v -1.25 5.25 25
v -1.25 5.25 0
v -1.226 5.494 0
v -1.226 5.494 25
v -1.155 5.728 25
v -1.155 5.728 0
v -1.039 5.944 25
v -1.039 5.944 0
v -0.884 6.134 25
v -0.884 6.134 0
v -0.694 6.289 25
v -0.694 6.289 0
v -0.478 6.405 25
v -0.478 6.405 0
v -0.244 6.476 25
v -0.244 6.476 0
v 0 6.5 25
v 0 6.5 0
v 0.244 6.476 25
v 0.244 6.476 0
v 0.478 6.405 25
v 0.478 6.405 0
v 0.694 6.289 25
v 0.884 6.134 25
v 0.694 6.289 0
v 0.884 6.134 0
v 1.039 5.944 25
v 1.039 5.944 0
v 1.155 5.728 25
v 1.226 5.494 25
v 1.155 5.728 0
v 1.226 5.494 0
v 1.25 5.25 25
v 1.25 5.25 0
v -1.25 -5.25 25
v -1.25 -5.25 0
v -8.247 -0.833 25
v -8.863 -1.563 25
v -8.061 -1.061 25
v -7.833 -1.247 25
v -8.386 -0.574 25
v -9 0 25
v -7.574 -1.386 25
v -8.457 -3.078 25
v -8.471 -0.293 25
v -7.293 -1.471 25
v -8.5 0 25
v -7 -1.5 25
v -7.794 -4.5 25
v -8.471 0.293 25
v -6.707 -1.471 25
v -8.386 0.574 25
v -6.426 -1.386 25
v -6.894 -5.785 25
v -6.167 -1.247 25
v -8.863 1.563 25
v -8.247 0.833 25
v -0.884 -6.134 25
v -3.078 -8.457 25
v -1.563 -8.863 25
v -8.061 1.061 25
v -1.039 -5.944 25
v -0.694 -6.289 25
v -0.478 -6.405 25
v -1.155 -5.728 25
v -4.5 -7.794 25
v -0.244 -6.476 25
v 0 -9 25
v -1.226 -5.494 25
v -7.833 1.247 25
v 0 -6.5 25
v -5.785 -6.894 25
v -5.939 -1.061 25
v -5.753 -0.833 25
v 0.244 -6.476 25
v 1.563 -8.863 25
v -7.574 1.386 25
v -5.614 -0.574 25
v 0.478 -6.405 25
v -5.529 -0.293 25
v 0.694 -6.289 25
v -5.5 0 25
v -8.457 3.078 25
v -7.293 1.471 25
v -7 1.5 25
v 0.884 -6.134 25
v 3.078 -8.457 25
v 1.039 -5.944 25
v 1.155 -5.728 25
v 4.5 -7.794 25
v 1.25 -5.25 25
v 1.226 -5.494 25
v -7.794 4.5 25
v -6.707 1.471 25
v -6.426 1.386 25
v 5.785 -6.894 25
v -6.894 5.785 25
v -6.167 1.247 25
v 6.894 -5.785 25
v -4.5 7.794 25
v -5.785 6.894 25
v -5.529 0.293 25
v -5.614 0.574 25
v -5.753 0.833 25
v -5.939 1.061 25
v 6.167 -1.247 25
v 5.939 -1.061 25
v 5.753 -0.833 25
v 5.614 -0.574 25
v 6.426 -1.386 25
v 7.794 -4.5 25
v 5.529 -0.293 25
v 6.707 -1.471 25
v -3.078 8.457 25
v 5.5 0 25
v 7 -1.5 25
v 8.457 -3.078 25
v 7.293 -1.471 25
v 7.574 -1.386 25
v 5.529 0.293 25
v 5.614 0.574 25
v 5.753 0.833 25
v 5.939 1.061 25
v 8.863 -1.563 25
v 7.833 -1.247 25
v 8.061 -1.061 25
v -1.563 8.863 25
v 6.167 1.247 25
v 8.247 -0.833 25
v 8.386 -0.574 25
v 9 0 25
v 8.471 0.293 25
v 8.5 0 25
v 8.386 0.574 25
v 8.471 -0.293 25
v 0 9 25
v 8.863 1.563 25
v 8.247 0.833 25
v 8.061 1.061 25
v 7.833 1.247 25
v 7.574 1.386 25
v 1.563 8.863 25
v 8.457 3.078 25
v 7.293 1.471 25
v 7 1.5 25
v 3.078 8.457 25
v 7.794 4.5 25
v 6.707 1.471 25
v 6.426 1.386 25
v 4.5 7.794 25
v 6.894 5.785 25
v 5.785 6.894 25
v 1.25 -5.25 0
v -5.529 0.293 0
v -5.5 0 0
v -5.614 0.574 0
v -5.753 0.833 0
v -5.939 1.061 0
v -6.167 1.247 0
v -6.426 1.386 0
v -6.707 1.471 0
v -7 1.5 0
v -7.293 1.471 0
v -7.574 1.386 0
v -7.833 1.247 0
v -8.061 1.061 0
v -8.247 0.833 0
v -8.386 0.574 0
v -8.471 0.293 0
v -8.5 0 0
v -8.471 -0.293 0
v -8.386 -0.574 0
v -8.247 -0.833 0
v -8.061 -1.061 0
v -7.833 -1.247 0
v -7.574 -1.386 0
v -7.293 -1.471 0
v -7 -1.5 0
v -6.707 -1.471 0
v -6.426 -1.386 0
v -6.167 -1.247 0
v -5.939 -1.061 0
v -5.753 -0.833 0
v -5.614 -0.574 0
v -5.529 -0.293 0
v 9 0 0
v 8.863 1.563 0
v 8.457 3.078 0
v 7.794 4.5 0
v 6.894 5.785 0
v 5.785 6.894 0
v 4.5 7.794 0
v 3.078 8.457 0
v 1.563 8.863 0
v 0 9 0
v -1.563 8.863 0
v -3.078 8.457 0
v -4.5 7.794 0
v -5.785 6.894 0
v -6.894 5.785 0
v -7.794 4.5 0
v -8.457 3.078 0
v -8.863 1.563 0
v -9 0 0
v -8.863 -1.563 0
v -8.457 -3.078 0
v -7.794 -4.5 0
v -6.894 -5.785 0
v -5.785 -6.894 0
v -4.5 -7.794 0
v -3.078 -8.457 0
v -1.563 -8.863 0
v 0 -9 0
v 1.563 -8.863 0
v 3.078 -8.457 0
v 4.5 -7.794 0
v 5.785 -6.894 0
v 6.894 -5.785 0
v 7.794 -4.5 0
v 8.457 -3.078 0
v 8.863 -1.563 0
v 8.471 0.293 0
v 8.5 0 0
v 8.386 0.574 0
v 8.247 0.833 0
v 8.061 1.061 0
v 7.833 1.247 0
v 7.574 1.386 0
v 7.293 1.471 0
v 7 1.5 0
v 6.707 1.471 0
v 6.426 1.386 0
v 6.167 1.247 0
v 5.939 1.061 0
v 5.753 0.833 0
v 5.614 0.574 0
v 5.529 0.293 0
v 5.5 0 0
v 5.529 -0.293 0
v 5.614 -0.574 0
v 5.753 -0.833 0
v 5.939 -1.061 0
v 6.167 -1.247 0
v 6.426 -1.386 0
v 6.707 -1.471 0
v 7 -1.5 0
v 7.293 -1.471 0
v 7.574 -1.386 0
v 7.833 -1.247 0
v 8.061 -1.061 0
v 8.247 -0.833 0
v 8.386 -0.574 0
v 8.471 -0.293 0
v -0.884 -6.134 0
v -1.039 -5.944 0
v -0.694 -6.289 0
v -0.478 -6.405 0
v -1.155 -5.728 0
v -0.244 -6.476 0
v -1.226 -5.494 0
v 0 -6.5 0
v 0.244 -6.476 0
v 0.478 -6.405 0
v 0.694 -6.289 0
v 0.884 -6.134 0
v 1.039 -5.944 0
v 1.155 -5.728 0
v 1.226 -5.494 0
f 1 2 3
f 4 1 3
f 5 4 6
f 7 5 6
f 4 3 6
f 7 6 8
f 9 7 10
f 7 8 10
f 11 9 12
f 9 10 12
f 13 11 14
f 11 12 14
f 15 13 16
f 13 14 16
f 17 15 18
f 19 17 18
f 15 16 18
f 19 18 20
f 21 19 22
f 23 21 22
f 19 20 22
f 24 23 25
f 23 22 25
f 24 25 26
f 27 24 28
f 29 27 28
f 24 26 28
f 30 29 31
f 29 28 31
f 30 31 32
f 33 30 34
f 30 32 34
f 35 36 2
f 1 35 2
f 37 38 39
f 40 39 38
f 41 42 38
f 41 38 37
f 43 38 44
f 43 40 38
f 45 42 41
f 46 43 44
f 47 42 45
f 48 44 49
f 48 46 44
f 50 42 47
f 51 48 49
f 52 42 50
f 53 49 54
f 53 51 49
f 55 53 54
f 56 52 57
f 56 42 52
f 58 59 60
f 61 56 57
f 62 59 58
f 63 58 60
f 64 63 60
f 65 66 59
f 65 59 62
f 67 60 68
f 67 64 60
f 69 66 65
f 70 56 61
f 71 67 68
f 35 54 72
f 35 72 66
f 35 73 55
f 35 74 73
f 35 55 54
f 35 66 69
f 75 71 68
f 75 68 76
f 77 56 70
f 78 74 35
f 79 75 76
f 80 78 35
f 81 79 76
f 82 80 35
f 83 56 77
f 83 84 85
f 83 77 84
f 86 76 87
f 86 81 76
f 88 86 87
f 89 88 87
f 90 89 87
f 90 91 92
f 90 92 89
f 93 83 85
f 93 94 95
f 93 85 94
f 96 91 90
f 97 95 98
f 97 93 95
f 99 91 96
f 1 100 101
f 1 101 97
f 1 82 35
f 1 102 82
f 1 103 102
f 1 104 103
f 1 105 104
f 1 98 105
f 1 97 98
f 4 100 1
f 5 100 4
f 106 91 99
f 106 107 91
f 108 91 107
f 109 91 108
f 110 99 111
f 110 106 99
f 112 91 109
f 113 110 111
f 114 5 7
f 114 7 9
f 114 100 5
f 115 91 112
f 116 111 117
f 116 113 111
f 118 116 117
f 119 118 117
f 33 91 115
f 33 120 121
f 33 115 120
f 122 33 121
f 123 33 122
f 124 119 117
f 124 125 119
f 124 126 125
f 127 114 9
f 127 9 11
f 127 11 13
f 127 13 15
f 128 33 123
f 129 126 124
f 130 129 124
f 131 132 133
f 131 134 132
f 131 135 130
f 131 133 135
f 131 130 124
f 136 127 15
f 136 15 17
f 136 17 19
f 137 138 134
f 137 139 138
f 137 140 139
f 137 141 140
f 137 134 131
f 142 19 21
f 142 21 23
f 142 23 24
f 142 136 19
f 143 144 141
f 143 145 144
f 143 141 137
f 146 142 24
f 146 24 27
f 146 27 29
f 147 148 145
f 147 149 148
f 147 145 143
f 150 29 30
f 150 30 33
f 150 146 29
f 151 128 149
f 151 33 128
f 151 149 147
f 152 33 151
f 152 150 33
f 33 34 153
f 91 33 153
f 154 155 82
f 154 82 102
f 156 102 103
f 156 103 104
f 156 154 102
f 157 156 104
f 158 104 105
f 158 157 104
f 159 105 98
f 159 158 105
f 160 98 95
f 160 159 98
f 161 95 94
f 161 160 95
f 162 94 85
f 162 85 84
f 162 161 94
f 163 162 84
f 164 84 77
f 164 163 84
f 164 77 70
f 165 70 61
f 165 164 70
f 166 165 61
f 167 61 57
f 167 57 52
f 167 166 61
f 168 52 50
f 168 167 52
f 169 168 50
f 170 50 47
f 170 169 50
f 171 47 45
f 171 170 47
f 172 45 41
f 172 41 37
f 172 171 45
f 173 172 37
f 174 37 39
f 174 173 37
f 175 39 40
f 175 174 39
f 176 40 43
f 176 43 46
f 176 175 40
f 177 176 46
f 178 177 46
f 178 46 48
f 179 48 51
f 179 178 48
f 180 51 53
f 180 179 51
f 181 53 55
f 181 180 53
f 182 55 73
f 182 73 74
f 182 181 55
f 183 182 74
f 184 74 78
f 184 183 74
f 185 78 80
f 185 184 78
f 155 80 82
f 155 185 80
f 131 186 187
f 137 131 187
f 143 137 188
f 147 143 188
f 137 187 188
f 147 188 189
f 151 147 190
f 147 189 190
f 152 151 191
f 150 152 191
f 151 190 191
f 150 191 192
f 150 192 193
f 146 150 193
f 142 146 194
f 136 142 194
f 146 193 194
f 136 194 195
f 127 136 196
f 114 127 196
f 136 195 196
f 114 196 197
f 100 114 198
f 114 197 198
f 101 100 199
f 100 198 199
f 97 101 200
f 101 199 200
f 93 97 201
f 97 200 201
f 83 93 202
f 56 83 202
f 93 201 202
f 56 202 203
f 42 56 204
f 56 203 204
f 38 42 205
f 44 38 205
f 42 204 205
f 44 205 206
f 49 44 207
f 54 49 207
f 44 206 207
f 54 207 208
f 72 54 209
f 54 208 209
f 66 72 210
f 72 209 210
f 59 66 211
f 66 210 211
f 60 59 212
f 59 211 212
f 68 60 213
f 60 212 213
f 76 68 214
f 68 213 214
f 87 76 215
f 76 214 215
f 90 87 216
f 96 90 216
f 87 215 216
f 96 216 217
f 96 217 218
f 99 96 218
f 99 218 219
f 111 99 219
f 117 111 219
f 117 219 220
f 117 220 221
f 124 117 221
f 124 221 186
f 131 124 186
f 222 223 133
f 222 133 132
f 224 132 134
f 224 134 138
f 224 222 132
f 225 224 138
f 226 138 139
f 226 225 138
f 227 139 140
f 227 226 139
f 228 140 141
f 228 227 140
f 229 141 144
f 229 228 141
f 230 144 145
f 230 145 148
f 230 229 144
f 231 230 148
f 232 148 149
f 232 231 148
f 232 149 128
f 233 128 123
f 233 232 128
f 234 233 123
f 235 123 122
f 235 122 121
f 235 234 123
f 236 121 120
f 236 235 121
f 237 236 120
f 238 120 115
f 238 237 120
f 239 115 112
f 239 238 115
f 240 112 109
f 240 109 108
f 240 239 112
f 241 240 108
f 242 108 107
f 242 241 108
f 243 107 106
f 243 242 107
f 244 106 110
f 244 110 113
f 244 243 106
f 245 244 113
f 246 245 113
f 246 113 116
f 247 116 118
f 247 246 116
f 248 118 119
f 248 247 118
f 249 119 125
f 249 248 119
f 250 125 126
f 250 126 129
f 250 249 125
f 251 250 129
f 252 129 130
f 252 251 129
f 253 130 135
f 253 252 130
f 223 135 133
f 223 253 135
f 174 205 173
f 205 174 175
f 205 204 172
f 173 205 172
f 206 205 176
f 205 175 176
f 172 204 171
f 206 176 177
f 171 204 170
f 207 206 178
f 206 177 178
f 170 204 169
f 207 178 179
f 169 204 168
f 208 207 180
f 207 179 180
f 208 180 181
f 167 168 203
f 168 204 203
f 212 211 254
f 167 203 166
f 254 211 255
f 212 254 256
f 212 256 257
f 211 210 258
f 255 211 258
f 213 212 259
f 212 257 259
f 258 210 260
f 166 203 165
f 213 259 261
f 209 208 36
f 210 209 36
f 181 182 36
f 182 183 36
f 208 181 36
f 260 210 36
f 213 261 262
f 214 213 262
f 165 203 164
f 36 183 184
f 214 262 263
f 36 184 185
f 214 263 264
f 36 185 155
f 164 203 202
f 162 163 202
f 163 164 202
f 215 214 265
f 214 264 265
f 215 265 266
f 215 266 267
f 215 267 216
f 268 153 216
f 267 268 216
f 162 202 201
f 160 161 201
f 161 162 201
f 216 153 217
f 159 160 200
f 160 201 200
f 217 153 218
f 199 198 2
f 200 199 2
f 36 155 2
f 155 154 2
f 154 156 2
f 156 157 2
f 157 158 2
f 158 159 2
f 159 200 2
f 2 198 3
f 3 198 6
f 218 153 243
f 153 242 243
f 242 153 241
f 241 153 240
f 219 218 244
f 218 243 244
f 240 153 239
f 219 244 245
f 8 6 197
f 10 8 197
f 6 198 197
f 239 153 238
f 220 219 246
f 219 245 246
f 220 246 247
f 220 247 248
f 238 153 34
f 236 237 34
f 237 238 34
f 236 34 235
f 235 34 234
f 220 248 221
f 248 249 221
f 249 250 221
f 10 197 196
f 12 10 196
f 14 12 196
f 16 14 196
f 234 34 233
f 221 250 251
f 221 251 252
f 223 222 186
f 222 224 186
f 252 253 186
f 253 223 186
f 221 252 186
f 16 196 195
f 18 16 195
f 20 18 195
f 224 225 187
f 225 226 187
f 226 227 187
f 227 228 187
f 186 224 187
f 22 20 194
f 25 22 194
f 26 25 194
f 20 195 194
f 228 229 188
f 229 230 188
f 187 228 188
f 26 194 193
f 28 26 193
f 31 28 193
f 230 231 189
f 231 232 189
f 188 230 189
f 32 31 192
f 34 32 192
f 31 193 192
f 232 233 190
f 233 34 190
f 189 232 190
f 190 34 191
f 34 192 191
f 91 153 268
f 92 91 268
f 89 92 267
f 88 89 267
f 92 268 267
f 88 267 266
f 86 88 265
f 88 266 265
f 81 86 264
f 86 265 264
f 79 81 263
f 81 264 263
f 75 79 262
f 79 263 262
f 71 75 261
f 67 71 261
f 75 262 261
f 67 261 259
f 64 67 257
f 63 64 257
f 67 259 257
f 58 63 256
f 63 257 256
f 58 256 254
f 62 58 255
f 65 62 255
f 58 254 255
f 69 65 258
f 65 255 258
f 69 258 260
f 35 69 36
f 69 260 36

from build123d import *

# Parameters (mm, degrees)
F0_R     = 9
F0_R_2   = 1.5
F1_DEPTH = 25


with BuildPart() as f1:
    # F0 (on Top) → F1 (new body)
    with BuildSketch(Plane.XY):
        Circle(F0_R)
        with Locations((-7, 0)):
            Circle(F0_R_2, mode=Mode.SUBTRACT)
        with BuildLine():
            ThreePointArc((-1.25, 5.25), (0, 6.5), (1.25, 5.25))
            Line((1.25, 5.25), (1.25, -5.25))
            ThreePointArc((1.25, -5.25), (0, -6.5), (-1.25, -5.25))
            Line((-1.25, -5.25), (-1.25, 5.25))
        make_face(mode=Mode.SUBTRACT)
        with Locations((7, 0)):
            Circle(F0_R_2, mode=Mode.SUBTRACT)
    extrude(amount=F1_DEPTH)


solid = f1.part
